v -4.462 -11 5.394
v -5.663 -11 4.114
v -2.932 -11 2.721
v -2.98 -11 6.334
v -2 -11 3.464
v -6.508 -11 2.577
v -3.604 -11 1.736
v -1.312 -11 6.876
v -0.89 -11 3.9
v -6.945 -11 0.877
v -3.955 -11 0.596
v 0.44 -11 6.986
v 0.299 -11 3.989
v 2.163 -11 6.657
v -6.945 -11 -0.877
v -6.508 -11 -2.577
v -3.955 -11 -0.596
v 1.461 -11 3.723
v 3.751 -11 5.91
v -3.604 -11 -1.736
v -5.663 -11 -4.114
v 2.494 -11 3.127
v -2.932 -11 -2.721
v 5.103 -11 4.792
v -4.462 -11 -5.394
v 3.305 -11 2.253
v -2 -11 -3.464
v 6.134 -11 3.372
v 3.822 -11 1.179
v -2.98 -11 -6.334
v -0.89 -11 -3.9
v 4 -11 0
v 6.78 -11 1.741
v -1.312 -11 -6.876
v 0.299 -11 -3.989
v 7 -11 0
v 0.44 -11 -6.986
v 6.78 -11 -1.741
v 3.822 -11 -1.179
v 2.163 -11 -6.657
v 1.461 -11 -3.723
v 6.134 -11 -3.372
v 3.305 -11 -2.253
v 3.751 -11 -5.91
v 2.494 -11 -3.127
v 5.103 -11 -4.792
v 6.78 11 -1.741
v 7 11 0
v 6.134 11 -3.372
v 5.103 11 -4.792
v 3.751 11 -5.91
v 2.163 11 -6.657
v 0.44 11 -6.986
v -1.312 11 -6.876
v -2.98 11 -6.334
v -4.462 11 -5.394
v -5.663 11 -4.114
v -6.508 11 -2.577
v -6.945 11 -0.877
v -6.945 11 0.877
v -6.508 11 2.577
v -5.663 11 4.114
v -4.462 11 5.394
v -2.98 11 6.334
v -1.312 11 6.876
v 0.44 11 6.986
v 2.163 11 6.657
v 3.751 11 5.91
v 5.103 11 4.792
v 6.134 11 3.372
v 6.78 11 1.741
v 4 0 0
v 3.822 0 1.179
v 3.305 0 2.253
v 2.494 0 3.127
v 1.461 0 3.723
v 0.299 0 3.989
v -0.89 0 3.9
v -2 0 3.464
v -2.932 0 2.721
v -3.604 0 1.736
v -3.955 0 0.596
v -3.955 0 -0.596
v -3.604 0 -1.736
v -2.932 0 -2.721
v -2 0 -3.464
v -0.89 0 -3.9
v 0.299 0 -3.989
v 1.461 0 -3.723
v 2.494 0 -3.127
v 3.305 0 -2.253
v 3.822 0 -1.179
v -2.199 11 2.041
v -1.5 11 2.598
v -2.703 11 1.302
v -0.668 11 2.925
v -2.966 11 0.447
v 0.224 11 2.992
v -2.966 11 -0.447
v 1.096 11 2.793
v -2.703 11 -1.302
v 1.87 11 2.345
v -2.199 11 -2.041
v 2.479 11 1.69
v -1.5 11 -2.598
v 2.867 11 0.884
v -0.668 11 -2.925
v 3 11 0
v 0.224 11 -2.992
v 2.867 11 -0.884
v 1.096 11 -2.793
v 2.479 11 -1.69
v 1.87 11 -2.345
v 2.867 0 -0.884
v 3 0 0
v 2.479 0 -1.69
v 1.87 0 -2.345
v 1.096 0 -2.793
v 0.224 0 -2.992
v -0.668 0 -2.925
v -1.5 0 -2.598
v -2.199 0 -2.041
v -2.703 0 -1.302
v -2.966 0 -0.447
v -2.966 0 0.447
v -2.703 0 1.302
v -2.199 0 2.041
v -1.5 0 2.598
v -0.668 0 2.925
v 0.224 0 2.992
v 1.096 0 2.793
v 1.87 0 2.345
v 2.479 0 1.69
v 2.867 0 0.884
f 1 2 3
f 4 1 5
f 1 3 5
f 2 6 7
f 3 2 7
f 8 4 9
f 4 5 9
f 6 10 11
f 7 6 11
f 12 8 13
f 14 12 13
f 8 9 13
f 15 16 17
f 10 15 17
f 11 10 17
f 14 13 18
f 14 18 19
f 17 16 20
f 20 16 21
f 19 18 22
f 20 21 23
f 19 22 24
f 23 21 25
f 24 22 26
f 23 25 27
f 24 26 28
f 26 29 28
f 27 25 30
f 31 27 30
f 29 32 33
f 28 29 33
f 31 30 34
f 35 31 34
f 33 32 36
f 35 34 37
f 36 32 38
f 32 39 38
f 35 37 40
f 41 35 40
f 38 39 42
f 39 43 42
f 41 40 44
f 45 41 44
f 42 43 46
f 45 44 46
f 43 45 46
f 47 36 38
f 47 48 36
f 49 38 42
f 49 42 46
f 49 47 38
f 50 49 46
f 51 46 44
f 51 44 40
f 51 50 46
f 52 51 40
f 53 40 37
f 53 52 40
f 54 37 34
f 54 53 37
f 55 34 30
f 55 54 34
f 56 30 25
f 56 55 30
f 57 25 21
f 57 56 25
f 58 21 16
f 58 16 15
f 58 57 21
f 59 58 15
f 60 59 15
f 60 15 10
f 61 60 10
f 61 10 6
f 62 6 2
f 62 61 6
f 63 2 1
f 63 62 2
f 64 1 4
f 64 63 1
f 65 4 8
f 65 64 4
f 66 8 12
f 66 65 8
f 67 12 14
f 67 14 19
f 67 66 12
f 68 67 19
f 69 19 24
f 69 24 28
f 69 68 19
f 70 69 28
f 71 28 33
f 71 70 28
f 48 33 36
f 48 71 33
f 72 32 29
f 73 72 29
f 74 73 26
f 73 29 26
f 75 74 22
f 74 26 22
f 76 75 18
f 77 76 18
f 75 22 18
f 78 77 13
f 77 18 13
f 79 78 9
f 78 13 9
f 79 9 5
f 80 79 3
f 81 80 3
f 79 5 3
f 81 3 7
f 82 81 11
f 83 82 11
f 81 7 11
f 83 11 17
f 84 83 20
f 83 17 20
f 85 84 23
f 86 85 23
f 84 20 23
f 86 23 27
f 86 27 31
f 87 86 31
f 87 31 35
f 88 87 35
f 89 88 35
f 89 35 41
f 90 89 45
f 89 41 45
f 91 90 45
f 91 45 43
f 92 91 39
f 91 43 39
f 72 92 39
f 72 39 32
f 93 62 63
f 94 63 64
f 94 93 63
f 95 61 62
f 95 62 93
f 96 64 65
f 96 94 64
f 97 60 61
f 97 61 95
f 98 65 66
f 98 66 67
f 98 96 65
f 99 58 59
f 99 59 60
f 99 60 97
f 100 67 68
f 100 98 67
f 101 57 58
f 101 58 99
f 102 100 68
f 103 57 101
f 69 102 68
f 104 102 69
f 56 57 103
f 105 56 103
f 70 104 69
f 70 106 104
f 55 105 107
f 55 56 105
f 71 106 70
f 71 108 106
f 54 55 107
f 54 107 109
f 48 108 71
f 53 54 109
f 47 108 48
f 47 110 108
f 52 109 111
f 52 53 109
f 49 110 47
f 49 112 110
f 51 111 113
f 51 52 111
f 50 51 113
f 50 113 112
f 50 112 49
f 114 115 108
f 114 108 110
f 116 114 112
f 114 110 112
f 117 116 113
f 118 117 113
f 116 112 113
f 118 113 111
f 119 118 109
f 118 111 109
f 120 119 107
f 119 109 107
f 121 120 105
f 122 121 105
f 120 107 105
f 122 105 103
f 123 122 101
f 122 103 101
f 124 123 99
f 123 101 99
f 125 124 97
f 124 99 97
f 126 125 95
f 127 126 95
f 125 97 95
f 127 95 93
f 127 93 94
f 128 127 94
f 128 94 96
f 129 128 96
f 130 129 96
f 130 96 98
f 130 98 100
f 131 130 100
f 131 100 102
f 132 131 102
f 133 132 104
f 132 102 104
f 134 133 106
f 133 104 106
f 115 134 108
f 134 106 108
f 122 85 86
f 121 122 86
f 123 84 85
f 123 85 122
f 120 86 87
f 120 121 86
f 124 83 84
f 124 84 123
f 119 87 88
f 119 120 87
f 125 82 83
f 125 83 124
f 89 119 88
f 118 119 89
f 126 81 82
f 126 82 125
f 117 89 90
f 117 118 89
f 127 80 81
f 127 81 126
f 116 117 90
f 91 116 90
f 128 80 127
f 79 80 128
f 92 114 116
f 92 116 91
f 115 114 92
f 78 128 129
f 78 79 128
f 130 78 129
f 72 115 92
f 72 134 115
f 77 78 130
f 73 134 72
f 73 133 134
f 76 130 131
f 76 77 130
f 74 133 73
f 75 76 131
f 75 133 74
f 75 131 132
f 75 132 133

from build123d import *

# Parameters (mm, degrees)
SKETCH1_R           = 7
BOSS_EXTRUDE1_DEPTH = 11
SKETCH2_R           = 3
CUT_EXTRUDE1_DEPTH  = 11
SKETCH3_R           = 4
CUT_EXTRUDE2_DEPTH  = 11


with BuildPart() as part:
    # Sketch1 → Boss-Extrude1 (new body, symmetric)
    with BuildSketch(Plane(origin=(0, 0, 0), x_dir=(1, 0, 0), z_dir=(0, 1, 0))):
        Circle(SKETCH1_R)
    extrude(amount=BOSS_EXTRUDE1_DEPTH, both=True)

    # Sketch2 → Cut-Extrude1 (cut)
    with BuildSketch(Plane(origin=(0, 11, 0), x_dir=(1, 0, 0), z_dir=(0, 1, 0))):
        Circle(SKETCH2_R)
    extrude(amount=-CUT_EXTRUDE1_DEPTH, mode=Mode.SUBTRACT)

    # Sketch3 → Cut-Extrude2 (cut)
    with BuildSketch(Plane.XZ.offset(11)):
        Circle(SKETCH3_R)
    extrude(amount=-CUT_EXTRUDE2_DEPTH, mode=Mode.SUBTRACT)


solid = part.part
